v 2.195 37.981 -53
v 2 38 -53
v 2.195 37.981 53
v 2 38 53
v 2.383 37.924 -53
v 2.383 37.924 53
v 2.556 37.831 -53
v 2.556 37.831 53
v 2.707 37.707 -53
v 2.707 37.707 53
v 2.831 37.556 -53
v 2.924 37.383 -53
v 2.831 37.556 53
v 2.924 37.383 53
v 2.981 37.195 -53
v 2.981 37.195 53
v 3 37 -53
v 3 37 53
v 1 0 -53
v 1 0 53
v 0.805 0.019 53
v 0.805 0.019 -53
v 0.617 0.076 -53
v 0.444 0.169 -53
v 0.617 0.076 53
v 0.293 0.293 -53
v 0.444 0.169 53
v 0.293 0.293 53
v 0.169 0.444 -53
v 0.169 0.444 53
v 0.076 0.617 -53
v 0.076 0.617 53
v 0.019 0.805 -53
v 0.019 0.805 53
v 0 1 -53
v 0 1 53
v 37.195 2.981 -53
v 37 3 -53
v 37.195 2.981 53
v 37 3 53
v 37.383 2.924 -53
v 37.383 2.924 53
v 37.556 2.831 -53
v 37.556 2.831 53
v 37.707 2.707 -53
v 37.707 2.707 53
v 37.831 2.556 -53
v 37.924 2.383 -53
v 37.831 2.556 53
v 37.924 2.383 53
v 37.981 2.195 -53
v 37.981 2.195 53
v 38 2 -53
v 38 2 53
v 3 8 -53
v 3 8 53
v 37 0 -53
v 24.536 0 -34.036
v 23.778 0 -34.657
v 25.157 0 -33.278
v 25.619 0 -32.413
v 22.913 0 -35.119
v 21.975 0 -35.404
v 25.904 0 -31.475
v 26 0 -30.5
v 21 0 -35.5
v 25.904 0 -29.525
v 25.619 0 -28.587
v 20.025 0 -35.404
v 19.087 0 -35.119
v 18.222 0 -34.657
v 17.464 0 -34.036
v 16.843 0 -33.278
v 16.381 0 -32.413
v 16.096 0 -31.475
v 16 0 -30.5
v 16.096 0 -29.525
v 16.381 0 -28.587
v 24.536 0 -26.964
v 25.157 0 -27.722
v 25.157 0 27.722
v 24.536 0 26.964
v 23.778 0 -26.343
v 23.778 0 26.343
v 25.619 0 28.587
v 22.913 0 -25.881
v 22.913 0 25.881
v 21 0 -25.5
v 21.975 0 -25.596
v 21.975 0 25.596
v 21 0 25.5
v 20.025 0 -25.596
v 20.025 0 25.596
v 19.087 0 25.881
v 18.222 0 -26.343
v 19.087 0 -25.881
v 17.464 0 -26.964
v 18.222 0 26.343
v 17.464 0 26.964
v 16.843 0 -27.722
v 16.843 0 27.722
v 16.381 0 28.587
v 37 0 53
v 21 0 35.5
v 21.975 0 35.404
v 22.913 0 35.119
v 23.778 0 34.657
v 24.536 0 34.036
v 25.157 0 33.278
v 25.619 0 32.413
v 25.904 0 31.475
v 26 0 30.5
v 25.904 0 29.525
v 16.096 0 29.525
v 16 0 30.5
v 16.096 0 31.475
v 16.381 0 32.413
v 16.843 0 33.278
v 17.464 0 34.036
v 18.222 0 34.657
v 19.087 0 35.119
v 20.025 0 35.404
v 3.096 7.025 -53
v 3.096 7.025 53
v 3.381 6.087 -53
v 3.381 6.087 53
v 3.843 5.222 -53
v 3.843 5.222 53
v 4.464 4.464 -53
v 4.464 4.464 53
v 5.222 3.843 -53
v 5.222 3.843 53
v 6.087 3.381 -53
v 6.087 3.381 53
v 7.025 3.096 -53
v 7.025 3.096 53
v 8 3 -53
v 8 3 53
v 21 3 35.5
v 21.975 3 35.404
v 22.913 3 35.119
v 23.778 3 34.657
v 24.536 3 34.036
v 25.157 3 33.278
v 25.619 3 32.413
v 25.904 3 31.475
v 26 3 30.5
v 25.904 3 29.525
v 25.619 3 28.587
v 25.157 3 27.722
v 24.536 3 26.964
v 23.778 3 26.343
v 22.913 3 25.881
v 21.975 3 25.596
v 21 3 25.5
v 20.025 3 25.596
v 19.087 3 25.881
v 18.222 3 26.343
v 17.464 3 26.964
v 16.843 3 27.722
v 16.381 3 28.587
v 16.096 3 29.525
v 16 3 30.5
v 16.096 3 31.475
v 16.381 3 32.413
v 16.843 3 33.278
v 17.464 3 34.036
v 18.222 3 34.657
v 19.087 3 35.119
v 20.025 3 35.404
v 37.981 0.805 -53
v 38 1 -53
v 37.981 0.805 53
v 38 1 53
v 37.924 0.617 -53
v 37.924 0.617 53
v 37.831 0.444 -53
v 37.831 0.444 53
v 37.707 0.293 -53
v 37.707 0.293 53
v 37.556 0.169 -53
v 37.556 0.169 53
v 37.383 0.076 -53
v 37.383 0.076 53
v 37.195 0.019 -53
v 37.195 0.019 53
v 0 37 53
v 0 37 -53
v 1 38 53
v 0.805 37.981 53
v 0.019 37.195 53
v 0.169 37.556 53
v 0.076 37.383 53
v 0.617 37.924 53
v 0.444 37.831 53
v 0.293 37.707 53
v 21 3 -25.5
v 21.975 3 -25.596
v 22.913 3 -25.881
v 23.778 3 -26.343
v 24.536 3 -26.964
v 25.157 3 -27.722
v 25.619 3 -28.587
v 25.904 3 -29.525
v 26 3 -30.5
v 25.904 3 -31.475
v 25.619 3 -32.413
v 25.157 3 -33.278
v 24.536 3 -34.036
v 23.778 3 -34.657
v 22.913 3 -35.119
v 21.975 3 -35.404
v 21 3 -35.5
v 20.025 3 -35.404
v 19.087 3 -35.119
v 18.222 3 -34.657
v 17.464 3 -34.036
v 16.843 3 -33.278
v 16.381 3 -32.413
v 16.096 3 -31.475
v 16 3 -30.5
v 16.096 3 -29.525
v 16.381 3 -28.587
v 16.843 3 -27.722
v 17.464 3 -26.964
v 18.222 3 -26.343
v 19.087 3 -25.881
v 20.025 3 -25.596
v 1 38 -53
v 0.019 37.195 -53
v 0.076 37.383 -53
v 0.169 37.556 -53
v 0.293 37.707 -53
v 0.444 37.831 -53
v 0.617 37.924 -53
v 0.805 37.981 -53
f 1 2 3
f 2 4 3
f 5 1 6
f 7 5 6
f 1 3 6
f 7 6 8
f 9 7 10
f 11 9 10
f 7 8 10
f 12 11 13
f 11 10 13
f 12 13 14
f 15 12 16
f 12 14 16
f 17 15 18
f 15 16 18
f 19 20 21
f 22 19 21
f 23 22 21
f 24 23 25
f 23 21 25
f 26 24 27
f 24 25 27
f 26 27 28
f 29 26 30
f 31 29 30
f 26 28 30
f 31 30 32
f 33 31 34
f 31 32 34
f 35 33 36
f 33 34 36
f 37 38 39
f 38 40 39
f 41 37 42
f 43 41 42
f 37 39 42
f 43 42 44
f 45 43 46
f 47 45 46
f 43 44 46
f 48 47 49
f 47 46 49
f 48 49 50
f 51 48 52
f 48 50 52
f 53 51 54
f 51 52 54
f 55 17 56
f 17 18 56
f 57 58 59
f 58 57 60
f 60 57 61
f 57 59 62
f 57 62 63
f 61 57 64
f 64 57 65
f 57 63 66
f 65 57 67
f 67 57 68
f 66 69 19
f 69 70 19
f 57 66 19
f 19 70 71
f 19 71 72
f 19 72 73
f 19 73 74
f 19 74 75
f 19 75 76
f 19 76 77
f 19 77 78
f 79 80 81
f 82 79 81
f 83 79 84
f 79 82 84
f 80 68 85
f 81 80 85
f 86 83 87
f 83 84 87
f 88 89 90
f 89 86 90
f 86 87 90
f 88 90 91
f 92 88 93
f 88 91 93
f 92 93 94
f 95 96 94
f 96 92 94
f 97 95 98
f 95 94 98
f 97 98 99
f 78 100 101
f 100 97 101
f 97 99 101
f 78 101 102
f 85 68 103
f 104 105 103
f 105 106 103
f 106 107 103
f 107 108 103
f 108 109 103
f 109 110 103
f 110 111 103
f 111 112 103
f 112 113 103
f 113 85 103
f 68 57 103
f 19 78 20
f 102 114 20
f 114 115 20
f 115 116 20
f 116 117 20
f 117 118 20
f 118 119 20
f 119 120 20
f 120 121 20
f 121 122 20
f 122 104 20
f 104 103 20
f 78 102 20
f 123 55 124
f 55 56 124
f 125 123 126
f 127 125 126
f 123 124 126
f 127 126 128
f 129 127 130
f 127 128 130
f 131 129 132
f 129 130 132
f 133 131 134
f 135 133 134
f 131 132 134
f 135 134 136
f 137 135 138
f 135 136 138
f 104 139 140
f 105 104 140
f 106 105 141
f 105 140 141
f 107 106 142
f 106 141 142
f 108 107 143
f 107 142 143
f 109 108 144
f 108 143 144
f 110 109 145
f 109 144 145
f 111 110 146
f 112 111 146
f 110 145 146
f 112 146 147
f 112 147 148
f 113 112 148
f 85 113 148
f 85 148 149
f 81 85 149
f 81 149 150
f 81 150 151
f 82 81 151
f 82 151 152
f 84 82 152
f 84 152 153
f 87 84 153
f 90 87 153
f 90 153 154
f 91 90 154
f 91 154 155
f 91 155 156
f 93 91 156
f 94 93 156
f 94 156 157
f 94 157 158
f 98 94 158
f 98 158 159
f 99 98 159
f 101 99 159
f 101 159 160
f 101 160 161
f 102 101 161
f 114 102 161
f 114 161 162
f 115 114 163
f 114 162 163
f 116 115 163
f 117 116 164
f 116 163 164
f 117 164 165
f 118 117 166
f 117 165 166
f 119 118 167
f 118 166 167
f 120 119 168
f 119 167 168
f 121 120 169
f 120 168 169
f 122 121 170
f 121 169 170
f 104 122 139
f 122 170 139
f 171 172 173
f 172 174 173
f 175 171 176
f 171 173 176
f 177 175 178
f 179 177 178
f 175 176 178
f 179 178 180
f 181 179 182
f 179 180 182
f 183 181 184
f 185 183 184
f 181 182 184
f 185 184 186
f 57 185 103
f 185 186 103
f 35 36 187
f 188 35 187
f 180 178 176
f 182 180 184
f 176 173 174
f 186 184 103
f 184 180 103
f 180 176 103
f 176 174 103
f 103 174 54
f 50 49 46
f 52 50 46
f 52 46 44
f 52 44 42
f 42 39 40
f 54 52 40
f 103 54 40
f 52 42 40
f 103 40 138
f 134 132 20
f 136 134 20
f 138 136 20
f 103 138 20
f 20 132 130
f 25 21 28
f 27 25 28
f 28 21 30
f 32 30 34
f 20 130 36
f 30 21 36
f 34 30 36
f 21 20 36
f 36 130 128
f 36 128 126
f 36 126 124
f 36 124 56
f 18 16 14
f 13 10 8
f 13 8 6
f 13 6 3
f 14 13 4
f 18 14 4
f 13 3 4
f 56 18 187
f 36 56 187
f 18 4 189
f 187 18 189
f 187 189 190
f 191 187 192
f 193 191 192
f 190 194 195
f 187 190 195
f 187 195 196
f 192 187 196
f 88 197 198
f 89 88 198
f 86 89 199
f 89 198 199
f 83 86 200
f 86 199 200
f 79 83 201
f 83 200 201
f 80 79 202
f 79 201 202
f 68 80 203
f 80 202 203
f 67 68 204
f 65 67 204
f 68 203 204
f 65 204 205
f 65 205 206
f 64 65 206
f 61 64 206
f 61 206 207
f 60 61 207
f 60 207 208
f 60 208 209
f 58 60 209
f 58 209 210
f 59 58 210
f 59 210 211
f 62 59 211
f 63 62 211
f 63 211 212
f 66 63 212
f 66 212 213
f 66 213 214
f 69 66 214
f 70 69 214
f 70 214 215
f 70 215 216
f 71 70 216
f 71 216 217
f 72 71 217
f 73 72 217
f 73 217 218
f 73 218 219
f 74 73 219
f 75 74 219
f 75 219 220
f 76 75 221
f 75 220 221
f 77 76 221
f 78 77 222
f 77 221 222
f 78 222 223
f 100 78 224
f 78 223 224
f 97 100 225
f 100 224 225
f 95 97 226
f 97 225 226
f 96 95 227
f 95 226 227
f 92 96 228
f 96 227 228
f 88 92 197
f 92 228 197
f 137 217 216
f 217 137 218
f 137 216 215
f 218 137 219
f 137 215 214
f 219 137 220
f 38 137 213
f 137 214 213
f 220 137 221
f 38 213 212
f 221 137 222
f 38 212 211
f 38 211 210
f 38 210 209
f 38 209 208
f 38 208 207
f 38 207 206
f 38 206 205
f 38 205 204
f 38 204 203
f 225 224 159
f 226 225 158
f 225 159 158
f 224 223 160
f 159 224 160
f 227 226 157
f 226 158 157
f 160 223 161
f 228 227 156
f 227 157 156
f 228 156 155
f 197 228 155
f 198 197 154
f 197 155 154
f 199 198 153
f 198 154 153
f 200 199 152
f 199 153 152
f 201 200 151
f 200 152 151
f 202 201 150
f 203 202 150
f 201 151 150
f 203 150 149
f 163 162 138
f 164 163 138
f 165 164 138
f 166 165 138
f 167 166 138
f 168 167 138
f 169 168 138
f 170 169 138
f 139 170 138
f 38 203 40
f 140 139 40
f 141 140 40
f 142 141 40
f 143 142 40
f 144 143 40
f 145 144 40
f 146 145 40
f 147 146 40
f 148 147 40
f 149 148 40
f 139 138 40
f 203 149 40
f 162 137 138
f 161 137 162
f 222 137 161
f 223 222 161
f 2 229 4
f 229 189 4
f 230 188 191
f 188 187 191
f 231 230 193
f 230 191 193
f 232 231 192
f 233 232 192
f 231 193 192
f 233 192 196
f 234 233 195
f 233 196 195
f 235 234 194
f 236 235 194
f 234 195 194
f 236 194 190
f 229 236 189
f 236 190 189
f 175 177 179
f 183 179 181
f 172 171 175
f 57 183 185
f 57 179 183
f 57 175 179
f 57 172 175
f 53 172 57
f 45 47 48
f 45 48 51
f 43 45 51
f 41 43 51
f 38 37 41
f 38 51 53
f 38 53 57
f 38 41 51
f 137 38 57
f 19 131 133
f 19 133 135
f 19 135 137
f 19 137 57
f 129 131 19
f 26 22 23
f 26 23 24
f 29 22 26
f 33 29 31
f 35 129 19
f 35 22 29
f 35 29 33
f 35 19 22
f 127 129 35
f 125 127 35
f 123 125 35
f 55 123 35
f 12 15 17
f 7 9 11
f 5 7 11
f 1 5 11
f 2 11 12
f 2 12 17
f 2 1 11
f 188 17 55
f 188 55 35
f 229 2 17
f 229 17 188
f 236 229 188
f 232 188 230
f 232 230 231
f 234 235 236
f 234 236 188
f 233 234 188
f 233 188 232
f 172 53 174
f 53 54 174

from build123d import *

# Parameters (mm, degrees)
EXTRUDE_1_DEPTH     = 53
SKETCH_3_R          = 5
CUT_EXTRUDE_1_DEPTH = 75.01351228


with BuildPart() as part:
    # 草图1 → 凸台-拉伸1 (new, symmetric)
    with BuildSketch(Plane.XY):
        with BuildLine():
            Line((0, 1), (0, 37))
            ThreePointArc((0, 37), (0.292893219, 37.707106781), (1, 38))
            Line((1, 38), (2, 38))
            ThreePointArc((2, 38), (2.707106781, 37.707106781), (3, 37))
            Line((3, 37), (3, 8))
            ThreePointArc((3, 8), (4.464466094, 4.464466094), (8, 3))
            Line((8, 3), (37, 3))
            ThreePointArc((37, 3), (37.707106781, 2.707106781), (38, 2))
            Line((38, 2), (38, 1))
            ThreePointArc((38, 1), (37.707106781, 0.292893219), (37, 0))
            Line((37, 0), (1, 0))
            ThreePointArc((1, 0), (0.292893219, 0.292893219), (0, 1))
        make_face()
    extrude(amount=EXTRUDE_1_DEPTH, both=True)

    # 草图3 → 切除-拉伸1 (cut, through all)
    with BuildSketch(Plane(origin=(0, 3, 0), x_dir=(1, 0, 0), z_dir=(0, 1, 0))):
        with Locations(Location((21, 30.5, 0), (0, 0, 270))):
            Circle(SKETCH_3_R)
        with Locations(Location((21, -30.5, 0), (0, 0, 270))):
            Circle(SKETCH_3_R)
    extrude(amount=-CUT_EXTRUDE_1_DEPTH, mode=Mode.SUBTRACT)


solid = part.part
